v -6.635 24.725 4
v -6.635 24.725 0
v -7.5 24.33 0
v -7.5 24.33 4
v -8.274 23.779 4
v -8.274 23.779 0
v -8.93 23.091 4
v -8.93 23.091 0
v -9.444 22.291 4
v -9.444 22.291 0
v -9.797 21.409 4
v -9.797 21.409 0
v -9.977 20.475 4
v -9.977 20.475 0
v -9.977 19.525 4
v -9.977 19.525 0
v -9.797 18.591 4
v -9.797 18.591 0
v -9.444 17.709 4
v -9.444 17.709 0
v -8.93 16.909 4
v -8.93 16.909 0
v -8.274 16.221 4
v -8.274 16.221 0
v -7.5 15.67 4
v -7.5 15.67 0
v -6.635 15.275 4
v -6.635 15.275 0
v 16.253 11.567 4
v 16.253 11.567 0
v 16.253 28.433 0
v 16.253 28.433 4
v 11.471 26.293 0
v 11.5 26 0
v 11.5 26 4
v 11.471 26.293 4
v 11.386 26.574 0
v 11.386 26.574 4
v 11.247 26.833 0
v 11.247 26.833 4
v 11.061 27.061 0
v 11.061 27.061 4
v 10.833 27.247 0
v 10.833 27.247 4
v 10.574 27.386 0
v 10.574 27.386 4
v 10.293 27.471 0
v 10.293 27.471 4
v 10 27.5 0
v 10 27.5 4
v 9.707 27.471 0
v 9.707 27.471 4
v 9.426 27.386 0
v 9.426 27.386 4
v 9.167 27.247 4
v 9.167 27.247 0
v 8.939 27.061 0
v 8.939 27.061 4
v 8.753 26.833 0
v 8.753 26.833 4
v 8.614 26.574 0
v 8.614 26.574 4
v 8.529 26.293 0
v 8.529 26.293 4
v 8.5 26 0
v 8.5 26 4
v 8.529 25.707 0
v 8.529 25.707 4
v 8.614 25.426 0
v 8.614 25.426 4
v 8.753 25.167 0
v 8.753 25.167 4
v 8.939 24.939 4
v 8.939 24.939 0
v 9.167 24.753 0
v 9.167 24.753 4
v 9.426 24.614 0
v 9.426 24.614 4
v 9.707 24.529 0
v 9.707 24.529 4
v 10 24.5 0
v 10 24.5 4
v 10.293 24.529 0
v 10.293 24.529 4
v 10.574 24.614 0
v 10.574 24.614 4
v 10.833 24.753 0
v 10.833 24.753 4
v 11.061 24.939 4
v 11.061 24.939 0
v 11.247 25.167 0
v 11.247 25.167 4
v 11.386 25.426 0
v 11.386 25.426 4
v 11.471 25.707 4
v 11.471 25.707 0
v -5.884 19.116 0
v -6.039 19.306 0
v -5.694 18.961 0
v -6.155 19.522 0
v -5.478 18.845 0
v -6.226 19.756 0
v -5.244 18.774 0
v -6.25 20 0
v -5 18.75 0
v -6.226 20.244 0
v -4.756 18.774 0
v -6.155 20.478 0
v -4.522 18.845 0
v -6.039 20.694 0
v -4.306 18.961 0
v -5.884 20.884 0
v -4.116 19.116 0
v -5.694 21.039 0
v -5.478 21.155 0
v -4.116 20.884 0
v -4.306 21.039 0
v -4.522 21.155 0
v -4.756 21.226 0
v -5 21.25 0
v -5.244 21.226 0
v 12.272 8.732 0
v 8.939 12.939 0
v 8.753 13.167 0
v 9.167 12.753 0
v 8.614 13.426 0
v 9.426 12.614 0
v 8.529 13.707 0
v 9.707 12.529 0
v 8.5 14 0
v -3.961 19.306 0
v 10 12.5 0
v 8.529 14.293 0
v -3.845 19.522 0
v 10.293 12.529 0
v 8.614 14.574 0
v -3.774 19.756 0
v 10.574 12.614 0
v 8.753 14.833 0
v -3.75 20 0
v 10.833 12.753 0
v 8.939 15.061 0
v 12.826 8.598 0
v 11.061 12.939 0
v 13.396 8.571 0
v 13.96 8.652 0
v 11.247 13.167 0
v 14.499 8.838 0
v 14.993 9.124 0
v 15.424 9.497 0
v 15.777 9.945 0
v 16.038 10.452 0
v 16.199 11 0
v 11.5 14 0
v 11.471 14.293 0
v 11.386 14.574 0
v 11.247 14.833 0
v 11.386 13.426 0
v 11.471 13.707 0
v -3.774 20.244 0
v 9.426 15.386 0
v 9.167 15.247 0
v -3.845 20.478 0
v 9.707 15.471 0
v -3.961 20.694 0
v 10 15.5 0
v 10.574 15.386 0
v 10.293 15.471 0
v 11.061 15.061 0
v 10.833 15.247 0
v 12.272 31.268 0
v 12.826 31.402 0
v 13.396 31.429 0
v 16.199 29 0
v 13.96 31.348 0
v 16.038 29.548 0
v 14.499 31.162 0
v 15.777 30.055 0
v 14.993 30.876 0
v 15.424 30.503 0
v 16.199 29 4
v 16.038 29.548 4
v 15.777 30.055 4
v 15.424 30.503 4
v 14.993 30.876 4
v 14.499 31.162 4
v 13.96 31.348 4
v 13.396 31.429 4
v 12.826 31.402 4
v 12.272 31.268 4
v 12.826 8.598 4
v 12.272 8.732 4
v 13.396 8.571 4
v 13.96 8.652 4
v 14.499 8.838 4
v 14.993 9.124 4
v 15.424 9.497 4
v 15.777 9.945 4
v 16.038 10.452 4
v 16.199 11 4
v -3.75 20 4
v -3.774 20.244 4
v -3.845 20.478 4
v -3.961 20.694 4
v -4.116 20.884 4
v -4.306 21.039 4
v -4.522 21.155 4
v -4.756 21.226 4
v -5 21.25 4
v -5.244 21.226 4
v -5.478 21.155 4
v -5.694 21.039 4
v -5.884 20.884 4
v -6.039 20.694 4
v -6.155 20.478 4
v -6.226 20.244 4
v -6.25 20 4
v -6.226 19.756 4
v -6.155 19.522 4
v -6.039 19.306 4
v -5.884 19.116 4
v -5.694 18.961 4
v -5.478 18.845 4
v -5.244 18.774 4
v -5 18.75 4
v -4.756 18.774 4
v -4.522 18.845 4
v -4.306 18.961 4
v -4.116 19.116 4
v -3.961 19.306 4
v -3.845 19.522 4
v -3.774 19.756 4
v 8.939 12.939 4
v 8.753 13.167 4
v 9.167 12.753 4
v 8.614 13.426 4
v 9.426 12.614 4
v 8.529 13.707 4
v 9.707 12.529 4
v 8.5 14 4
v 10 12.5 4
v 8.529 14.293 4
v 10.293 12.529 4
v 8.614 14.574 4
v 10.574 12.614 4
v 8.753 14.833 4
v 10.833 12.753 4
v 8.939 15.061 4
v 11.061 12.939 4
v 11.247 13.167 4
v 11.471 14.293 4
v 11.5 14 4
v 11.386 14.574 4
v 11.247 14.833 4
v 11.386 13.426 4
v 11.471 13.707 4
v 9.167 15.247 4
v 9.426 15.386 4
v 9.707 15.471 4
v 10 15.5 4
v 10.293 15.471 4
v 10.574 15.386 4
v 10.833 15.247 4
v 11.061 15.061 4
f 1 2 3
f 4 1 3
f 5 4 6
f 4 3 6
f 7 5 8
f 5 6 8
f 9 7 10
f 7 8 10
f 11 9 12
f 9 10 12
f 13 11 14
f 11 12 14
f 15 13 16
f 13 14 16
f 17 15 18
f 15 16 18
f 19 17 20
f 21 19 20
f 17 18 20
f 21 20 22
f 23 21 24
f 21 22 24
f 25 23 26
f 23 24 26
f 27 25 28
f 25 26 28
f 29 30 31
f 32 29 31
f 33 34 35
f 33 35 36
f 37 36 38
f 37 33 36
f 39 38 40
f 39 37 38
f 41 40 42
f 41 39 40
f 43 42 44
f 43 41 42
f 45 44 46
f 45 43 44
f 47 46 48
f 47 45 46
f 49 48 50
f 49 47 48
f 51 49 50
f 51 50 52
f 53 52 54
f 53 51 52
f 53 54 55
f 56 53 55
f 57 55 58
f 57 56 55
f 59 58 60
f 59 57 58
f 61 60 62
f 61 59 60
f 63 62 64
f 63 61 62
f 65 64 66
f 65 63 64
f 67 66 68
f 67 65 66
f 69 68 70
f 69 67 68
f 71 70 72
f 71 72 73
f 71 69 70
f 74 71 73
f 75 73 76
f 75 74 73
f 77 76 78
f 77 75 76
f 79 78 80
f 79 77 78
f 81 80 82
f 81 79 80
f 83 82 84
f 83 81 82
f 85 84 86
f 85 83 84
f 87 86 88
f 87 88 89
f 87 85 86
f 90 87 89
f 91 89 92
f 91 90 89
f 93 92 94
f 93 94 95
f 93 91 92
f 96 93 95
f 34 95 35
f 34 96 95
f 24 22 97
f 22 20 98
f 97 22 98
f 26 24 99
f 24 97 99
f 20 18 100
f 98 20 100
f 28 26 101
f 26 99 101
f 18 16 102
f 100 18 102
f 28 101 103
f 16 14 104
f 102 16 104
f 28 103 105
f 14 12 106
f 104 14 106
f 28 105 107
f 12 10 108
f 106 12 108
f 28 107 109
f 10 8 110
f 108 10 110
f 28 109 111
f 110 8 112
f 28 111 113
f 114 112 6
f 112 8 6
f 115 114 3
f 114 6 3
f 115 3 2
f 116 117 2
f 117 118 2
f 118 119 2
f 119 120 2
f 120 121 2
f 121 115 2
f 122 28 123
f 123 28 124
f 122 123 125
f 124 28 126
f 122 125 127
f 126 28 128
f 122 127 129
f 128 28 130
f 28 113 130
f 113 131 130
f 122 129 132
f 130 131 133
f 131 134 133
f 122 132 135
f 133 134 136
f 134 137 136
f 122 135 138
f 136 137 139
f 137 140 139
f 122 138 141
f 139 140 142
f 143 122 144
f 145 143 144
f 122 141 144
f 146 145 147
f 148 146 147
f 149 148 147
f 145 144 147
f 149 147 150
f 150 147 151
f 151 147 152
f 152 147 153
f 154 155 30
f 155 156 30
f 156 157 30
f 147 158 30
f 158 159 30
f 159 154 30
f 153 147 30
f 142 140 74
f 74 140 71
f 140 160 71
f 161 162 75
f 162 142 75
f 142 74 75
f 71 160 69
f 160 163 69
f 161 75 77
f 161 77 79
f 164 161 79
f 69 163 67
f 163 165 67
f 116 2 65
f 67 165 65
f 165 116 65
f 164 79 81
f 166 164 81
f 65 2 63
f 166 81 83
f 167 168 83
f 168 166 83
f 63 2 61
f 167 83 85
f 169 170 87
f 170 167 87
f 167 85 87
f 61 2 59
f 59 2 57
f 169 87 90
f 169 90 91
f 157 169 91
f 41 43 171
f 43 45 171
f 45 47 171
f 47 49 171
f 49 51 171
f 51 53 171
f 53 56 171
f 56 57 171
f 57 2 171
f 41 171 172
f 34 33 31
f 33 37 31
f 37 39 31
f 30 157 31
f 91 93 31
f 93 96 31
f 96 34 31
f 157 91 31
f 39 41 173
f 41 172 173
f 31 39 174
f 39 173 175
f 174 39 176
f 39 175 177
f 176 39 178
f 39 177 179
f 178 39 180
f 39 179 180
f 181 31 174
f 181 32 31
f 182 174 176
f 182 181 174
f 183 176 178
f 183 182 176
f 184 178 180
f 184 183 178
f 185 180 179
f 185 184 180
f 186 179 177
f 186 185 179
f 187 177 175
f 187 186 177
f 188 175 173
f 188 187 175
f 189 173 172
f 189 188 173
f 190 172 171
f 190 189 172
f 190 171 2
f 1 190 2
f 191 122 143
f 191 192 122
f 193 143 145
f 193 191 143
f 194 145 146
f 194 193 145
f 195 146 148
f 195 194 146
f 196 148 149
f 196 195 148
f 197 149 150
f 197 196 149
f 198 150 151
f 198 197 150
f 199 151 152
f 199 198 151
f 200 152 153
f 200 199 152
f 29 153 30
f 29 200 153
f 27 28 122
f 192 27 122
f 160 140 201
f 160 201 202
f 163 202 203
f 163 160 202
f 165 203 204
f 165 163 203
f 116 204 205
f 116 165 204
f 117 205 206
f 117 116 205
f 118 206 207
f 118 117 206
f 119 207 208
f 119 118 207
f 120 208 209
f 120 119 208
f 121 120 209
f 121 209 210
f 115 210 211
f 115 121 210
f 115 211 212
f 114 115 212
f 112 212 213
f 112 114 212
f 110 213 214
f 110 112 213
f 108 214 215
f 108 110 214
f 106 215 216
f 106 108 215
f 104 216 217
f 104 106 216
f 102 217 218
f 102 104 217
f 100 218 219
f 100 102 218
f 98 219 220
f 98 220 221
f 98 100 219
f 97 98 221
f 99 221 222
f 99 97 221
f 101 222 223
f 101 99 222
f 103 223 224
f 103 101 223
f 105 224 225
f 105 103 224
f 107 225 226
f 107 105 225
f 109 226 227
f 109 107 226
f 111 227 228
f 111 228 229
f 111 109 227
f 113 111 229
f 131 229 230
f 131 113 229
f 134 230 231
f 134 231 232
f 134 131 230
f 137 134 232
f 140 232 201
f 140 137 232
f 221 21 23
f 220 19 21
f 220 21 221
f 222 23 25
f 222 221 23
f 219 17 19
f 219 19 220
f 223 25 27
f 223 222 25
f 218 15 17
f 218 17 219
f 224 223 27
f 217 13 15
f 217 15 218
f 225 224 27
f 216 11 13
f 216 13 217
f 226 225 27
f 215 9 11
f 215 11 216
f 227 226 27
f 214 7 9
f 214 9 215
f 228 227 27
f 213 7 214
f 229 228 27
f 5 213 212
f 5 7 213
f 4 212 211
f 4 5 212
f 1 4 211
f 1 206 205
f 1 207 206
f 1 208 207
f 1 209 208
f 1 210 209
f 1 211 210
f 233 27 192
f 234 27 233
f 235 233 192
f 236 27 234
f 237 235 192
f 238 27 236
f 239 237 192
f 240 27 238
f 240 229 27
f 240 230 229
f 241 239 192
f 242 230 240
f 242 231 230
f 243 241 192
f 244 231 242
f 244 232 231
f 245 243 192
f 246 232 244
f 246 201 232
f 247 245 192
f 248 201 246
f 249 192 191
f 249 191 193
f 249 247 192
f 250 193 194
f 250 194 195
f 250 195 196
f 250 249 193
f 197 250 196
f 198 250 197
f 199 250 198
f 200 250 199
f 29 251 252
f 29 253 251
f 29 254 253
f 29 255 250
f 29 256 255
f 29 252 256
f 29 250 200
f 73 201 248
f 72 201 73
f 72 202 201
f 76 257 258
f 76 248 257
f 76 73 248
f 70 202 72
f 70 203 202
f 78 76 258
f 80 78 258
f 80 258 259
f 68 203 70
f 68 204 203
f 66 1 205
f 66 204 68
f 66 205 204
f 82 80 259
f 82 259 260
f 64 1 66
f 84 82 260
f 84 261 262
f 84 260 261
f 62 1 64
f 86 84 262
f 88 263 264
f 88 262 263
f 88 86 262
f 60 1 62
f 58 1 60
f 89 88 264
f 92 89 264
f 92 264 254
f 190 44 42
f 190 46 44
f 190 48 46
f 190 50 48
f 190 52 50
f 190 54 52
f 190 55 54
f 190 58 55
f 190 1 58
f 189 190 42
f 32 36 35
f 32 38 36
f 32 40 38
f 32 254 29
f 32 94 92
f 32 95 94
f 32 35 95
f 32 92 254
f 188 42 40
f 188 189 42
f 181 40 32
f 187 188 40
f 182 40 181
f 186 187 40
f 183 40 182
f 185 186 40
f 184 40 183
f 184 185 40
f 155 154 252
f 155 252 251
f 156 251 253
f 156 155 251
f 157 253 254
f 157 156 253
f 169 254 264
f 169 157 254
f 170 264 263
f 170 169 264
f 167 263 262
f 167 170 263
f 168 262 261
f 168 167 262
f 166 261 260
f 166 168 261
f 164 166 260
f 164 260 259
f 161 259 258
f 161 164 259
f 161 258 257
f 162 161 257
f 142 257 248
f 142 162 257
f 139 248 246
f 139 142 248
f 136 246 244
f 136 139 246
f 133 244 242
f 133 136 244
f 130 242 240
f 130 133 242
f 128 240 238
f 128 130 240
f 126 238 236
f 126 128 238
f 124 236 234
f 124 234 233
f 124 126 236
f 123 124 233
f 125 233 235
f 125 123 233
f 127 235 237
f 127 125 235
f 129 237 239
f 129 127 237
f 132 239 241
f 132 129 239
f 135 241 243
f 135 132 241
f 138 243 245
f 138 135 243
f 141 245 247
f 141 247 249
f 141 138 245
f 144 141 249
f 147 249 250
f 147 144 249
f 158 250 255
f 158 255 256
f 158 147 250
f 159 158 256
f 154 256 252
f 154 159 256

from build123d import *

# Parameters (mm, degrees)
SKETCH_1_R      = 1.25
SKETCH_1_R_2    = 1.5
EXTRUDE_1_DEPTH = 4
FILLET_1_R      = 3


with BuildPart() as part:
    # 草图1 → 凸台-拉伸1 (new body)
    with BuildSketch(Plane.XY):
        with BuildLine():
            Line((-6.635089387, 15.274909239), (16.252937679, 7.354644413))
            Line((16.252937679, 7.354644413), (16.252937679, 32.645355587))
            Line((16.252937679, 32.645355587), (-6.635089387, 24.725090761))
            ThreePointArc((-6.635089387, 24.725090761), (-10, 20), (-6.635089387, 15.274909239))
        make_face()
        with Locations((-5, 20)):
            Circle(SKETCH_1_R, mode=Mode.SUBTRACT)
        with Locations((10, 26)):
            Circle(SKETCH_1_R_2, mode=Mode.SUBTRACT)
        with Locations((10, 14)):
            Circle(SKETCH_1_R_2, mode=Mode.SUBTRACT)
    extrude(amount=EXTRUDE_1_DEPTH)

    # 圆角1
    fillet_1_edges = [part.edges().sort_by_distance(p)[0] for p in [
        (16.252937679, 32.645355587, 2),
        (16.252937679, 7.354644413, 2),
    ]]
    fillet(fillet_1_edges, radius=FILLET_1_R)


solid = part.part
